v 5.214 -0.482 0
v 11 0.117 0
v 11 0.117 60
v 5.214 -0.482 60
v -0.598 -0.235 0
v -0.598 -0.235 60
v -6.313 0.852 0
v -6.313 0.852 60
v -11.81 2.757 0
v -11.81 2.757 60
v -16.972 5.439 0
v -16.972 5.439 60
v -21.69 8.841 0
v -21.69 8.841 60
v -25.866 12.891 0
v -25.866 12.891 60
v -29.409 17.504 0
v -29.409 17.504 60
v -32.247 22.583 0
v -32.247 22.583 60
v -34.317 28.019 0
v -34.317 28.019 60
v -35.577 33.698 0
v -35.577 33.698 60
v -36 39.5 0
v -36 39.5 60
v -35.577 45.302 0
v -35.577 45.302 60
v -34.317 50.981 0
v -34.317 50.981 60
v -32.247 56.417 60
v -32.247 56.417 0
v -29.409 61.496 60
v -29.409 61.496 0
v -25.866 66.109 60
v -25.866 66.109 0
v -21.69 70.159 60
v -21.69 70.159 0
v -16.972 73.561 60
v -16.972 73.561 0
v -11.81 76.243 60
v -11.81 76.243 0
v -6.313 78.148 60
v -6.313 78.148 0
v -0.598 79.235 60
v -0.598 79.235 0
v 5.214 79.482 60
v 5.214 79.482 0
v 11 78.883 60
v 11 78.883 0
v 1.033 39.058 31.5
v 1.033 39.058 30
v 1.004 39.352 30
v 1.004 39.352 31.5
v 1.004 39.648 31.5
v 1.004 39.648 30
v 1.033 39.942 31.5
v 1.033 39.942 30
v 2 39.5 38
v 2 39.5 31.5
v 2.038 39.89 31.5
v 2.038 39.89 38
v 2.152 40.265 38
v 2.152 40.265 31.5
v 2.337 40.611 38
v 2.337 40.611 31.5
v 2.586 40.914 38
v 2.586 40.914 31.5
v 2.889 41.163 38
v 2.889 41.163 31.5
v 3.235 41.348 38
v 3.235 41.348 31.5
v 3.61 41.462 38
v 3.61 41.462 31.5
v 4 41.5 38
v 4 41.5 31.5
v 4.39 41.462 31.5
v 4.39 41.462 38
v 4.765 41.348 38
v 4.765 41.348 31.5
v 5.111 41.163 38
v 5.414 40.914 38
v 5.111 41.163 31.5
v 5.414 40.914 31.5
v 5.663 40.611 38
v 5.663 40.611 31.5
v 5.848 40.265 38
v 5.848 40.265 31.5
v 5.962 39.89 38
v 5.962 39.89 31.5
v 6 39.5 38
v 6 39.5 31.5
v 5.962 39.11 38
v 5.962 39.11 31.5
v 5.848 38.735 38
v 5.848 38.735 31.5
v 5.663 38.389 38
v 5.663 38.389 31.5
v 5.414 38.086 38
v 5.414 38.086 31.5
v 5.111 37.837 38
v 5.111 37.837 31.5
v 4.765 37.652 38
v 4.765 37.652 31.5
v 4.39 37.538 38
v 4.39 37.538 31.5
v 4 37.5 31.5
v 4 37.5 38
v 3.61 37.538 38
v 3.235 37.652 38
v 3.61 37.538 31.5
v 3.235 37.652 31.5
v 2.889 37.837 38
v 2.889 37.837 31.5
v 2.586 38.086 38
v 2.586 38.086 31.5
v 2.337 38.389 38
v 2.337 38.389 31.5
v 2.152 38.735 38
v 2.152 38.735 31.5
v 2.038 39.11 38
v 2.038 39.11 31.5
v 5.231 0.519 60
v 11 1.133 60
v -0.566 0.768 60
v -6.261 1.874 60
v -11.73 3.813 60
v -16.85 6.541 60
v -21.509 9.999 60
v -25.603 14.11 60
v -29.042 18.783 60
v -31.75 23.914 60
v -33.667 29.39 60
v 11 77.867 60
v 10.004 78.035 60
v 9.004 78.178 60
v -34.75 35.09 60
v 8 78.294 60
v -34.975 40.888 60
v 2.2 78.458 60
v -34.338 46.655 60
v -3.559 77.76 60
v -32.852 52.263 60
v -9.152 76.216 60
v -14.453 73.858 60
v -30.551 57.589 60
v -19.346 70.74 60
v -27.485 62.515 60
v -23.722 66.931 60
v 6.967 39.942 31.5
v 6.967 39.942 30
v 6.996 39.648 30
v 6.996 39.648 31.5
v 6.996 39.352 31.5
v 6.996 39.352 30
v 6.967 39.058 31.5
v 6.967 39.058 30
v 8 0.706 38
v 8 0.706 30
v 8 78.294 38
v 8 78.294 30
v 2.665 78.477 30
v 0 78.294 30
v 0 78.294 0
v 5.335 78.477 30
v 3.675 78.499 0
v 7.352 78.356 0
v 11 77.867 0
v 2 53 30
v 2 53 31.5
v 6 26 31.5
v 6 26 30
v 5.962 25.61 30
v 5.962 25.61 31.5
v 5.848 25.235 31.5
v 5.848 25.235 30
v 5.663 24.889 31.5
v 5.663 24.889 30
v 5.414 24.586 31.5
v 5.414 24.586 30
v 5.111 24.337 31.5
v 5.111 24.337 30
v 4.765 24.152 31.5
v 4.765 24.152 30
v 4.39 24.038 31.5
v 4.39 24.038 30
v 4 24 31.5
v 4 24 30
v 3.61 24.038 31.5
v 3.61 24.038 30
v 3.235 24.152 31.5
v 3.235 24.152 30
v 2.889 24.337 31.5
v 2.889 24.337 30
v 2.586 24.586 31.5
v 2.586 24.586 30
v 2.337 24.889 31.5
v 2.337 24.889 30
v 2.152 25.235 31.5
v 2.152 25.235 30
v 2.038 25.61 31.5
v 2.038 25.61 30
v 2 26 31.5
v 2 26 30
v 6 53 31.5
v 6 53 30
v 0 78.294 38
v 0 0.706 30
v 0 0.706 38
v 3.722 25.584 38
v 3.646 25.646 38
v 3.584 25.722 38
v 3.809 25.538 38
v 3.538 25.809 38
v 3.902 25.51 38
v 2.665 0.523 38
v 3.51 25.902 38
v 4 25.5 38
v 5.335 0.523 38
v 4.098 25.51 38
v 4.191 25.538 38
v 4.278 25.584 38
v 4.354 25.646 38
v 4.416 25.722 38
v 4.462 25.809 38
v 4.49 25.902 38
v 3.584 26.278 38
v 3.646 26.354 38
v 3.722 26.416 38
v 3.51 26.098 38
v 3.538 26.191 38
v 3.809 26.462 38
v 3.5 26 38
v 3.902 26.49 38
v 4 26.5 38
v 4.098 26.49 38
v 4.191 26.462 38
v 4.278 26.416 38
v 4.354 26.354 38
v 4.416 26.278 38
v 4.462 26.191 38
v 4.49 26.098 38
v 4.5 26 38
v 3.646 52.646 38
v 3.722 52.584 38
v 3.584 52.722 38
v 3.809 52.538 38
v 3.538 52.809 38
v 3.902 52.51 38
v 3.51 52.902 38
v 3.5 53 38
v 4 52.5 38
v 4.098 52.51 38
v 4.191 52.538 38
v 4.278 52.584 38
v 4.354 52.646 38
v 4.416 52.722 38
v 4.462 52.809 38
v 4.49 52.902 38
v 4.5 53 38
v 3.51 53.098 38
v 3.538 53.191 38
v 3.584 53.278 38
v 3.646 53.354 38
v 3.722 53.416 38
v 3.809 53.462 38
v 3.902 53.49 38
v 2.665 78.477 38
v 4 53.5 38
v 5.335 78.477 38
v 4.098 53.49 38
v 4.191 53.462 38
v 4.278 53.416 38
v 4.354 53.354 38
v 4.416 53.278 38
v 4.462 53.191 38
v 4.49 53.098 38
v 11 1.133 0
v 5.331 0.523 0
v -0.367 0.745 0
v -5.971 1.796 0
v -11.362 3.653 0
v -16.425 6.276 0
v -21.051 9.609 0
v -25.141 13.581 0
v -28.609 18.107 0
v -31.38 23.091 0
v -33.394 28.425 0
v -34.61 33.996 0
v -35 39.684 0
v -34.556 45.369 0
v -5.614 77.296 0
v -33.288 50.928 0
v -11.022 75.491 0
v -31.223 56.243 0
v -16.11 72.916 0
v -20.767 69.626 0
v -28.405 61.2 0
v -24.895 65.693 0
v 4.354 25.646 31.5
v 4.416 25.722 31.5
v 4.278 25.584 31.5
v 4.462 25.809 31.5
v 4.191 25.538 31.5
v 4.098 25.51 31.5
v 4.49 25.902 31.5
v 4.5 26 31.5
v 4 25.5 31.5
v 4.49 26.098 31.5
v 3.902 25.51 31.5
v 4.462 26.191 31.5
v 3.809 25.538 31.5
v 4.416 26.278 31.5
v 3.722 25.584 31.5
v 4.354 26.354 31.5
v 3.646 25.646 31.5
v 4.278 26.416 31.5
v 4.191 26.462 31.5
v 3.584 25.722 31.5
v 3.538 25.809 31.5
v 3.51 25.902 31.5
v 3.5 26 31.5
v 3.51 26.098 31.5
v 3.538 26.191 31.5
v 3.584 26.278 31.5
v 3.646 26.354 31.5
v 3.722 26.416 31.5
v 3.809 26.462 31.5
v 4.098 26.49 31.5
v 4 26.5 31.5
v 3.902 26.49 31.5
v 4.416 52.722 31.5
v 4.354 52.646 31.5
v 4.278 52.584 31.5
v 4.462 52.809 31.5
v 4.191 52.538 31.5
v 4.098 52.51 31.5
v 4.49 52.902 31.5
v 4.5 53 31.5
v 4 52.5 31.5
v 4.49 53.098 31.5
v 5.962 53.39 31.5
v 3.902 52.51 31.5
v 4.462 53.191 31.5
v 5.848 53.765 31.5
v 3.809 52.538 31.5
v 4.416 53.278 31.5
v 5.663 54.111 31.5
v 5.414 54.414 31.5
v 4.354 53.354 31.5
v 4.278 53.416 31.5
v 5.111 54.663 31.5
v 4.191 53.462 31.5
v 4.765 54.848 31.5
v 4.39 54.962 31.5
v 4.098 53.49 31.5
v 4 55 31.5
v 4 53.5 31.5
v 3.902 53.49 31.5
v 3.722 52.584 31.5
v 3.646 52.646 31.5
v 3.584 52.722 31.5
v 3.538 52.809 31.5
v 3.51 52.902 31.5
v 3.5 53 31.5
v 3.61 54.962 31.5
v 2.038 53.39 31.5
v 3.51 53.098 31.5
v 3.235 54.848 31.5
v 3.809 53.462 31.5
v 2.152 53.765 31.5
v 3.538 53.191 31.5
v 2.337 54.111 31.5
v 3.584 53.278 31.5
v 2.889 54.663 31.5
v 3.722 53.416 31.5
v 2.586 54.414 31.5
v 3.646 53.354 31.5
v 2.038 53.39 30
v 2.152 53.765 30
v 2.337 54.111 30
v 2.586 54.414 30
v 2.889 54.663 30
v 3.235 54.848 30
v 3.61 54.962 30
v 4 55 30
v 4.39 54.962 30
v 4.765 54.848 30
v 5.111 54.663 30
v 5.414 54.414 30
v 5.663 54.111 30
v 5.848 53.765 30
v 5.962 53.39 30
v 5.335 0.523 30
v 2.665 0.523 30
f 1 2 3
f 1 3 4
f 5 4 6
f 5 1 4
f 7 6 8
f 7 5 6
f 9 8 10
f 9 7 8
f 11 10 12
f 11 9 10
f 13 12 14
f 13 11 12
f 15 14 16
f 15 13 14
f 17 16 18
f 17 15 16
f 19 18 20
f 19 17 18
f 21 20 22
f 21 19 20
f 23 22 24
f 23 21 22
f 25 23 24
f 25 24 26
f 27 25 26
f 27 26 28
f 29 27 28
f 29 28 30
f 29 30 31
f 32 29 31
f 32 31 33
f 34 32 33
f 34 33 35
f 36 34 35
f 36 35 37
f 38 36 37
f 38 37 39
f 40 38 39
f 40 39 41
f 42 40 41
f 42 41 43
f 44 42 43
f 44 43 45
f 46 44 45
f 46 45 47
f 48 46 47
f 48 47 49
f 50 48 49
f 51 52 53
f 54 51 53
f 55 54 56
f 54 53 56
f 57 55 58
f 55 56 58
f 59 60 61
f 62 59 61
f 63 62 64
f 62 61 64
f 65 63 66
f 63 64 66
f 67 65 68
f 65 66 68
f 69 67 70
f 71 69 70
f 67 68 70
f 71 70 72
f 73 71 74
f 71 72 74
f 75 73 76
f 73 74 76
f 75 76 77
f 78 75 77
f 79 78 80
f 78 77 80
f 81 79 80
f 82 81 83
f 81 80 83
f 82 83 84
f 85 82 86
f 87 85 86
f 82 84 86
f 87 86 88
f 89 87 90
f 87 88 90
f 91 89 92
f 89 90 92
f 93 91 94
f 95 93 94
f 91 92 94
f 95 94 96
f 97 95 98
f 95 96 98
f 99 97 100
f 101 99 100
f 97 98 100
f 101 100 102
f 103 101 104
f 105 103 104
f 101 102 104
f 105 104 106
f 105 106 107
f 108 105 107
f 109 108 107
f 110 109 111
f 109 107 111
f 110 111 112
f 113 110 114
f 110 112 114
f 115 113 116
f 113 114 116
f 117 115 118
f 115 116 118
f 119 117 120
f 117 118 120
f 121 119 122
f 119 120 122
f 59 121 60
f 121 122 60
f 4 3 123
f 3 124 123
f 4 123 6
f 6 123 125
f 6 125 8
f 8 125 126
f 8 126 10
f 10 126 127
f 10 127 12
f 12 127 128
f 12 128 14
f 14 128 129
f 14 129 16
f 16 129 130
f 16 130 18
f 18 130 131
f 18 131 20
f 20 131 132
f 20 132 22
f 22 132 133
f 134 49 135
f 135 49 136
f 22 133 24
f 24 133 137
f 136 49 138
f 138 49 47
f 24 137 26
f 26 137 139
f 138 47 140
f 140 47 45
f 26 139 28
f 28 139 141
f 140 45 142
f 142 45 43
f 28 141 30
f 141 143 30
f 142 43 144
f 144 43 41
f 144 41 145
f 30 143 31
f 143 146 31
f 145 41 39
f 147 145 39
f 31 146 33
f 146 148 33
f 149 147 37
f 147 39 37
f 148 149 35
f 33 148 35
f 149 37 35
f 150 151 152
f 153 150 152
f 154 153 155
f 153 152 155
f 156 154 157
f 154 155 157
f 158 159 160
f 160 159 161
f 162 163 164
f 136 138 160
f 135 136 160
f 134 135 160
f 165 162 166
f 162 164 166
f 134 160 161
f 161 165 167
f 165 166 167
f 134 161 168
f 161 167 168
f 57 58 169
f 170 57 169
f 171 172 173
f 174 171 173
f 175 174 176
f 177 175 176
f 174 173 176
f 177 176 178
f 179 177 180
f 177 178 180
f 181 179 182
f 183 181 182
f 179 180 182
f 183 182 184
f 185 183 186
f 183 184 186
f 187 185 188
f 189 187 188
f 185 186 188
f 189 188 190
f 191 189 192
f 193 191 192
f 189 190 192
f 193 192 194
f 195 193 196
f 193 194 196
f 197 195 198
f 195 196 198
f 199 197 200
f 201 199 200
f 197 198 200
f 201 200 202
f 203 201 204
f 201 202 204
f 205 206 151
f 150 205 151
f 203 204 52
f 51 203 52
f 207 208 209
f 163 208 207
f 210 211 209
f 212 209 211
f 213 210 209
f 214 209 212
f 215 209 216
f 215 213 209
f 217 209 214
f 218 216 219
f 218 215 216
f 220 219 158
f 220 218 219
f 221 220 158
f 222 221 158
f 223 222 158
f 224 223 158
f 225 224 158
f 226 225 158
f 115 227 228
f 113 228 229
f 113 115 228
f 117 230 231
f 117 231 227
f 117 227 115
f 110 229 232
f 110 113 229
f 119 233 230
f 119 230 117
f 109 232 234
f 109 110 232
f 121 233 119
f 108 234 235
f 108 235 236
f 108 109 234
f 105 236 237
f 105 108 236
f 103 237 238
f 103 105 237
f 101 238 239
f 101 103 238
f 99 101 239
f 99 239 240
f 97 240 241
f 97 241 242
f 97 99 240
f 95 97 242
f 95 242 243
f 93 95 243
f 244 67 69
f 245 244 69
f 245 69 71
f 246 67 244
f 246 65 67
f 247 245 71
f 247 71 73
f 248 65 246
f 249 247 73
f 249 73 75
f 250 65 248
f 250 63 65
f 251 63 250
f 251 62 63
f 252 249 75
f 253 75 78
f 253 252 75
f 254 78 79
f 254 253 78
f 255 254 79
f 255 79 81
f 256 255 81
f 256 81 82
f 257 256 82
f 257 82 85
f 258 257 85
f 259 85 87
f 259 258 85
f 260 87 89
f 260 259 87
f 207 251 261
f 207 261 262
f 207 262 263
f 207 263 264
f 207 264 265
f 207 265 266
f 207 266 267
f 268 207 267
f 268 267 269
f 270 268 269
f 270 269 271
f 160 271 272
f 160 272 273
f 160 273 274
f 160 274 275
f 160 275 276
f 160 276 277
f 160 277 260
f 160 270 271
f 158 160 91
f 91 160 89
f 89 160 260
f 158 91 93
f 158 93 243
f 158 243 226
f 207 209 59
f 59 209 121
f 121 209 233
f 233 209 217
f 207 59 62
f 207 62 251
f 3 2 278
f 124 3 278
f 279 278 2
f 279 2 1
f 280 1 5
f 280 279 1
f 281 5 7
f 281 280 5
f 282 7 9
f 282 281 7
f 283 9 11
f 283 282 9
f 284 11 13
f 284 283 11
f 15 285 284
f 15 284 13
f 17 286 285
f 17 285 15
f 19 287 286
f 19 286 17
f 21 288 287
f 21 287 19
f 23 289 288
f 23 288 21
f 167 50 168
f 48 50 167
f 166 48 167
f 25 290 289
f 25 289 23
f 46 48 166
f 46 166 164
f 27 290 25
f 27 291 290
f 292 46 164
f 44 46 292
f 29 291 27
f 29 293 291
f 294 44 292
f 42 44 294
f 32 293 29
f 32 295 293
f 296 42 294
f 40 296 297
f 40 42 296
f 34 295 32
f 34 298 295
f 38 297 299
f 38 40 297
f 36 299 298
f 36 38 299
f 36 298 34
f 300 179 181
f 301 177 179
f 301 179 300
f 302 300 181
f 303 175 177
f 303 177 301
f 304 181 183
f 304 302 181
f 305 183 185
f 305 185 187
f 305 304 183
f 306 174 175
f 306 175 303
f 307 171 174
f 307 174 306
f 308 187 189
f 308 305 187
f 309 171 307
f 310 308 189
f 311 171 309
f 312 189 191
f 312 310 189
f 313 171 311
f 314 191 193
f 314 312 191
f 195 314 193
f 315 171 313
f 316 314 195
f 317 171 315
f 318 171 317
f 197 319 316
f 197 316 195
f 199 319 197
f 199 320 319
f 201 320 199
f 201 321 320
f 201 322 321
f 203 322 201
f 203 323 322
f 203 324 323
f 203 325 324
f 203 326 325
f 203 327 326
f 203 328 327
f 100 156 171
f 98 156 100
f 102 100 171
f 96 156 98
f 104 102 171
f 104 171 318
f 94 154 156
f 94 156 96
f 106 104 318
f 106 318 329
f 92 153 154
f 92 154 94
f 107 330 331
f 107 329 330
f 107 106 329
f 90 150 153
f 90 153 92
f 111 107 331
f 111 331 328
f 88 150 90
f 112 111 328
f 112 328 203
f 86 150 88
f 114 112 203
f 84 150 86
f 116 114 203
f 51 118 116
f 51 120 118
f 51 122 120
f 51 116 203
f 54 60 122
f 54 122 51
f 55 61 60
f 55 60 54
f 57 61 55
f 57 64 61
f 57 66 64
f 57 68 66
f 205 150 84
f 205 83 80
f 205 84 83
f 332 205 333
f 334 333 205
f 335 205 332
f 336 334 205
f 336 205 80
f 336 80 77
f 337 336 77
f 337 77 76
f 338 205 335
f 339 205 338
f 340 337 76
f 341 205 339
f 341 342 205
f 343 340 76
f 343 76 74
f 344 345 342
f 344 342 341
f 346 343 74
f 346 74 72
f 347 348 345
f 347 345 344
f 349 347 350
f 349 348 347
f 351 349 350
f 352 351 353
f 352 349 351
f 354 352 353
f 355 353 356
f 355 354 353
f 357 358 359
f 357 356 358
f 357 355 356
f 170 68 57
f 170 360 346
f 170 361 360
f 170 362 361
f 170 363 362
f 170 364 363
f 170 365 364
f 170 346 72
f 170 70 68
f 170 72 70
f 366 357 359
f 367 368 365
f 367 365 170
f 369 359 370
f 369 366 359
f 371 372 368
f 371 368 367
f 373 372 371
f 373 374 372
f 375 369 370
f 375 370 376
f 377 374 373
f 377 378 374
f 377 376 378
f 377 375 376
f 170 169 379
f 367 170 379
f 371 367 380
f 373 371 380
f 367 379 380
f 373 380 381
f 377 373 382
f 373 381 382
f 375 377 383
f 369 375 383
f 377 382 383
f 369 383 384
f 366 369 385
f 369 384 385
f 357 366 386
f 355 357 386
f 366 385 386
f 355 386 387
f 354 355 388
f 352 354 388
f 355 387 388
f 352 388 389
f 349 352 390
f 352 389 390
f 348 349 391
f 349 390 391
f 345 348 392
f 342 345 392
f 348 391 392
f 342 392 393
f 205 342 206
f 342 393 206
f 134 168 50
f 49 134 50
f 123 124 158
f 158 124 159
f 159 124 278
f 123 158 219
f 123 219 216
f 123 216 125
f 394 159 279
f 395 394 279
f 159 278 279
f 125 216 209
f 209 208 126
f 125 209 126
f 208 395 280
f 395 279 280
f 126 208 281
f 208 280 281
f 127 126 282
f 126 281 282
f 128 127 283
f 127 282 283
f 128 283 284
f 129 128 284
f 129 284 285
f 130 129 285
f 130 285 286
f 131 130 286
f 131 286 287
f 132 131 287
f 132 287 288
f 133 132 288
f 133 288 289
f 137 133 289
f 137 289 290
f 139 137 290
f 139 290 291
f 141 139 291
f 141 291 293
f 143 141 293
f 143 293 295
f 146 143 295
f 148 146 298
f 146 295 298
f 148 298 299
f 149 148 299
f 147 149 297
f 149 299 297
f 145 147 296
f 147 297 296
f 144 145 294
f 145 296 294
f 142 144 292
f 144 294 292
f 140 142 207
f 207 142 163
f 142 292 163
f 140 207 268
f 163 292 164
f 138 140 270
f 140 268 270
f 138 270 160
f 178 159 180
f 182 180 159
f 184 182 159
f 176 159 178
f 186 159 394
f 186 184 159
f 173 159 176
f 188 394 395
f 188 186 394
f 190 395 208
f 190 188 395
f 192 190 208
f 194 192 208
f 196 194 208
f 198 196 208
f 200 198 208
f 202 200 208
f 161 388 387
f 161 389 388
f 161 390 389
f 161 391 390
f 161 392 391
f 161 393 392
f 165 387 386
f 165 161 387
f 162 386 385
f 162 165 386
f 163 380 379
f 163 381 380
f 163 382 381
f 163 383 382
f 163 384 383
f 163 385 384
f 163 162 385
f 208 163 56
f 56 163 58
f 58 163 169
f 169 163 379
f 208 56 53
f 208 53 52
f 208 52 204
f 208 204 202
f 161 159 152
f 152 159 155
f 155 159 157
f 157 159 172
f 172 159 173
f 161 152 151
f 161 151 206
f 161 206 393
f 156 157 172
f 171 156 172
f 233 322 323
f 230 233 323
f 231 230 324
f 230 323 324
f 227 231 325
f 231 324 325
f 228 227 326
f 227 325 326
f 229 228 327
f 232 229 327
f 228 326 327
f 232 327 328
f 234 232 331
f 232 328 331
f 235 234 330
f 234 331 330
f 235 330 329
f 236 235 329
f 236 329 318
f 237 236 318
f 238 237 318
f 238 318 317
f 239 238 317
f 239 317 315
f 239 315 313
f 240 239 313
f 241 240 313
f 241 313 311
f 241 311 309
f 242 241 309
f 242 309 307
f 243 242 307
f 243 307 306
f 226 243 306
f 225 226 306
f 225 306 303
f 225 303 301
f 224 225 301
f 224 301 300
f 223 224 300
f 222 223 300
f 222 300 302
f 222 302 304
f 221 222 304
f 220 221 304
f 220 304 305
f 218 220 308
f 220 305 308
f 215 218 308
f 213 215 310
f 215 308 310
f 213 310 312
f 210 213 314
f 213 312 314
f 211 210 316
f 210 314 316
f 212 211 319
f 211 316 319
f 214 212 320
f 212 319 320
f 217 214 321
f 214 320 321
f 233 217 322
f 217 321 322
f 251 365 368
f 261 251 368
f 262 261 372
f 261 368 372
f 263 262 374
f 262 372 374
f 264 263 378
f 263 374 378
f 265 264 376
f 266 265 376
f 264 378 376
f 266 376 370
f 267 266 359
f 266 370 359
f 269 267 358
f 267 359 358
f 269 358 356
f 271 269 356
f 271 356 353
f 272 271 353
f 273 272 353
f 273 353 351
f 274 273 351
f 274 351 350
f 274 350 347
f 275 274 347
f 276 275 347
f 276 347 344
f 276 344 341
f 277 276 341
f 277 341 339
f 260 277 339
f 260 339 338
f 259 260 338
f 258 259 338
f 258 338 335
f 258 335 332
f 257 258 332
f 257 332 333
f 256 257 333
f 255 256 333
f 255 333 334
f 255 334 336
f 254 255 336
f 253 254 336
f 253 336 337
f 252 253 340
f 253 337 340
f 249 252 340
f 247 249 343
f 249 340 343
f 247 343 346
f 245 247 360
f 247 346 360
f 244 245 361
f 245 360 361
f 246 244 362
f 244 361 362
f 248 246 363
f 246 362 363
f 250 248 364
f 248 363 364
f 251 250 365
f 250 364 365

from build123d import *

# Parameters (mm, degrees)
ESQUISSE1_W              = 8
ESQUISSE1_H              = 79
BOSS_EXTRU_1_DEPTH       = 60
ESQUISSE3_R              = 40
ESQUISSE3_R_2            = 39
BOSS_EXTRU_2_DEPTH       = 60
ESQUISSE4_R              = 39
ENL_V_MAT_EXTRU_3_DEPTH  = 30
ENL_V_MAT_EXTRU_5_DEPTH  = 1.5
ESQUISSE6_R              = 39
ENL_V_MAT_EXTRU_6_DEPTH  = 22
ESQUISSE7_R              = 2
ENL_V_MAT_EXTRU_7_DEPTH  = 6.5
ESQUISSE9_R              = 0.5
ENL_V_MAT_EXTRU_8_DEPTH  = 29.5
ENL_V_MAT_EXTRU_10_REACH = 62
ESQUISSE11_W             = 40
ESQUISSE11_H             = 82


with BuildPart() as part:
    # Esquisse1 → Boss.-Extru.1 (new body)
    with BuildSketch(Plane.XY):
        with Locations((4, 39.5)):
            Rectangle(ESQUISSE1_W, ESQUISSE1_H)
    extrude(amount=BOSS_EXTRU_1_DEPTH)

    # Esquisse3 → Boss.-Extru.2 (add)
    with BuildSketch(Plane(origin=(0, 0, 0), x_dir=(-1, 0, 0), z_dir=(0, 0, -1))):
        with Locations((-4, 39.5)):
            Circle(ESQUISSE3_R)
        with Locations((-4, 39.5)):
            Circle(ESQUISSE3_R_2, mode=Mode.SUBTRACT)
    extrude(amount=-BOSS_EXTRU_2_DEPTH)

    # Esquisse4 → Enlèv. mat.-Extru.3 (cut)
    with BuildSketch(Plane(origin=(0, 0, 0), x_dir=(-1, 0, 0), z_dir=(0, 0, -1))):
        with Locations((-4, 39.5)):
            Circle(ESQUISSE4_R)
    extrude(amount=-ENL_V_MAT_EXTRU_3_DEPTH, mode=Mode.SUBTRACT)

    # Esquisse5 → Enlèv. mat.-Extru.5 (cut)
    with BuildSketch(Plane(origin=(0, 0, 30), x_dir=(-1, 0, 0), z_dir=(0, 0, -1))):
        with BuildLine():
            Line((-6, 53), (-6.967257844, 39.9420191))
            ThreePointArc((-6.967257844, 39.9420191), (-7, 39.5), (-6.967257844, 39.0579809))
            Line((-6.967257844, 39.0579809), (-6, 26))
            ThreePointArc((-6, 26), (-4, 24), (-2, 26))
            Line((-2, 26), (-1.032742156, 39.0579809))
            ThreePointArc((-1.032742156, 39.0579809), (-1, 39.5), (-1.032742156, 39.9420191))
            Line((-1.032742156, 39.9420191), (-2, 53))
            ThreePointArc((-2, 53), (-4, 55), (-6, 53))
        make_face()
    extrude(amount=-ENL_V_MAT_EXTRU_5_DEPTH, mode=Mode.SUBTRACT)

    # Esquisse6 → Enlèv. mat.-Extru.6 (cut)
    with BuildSketch(Plane.XY.offset(60)):
        with Locations((4, 39.5)):
            Circle(ESQUISSE6_R)
    extrude(amount=-ENL_V_MAT_EXTRU_6_DEPTH, mode=Mode.SUBTRACT)

    # Esquisse7 → Enlèv. mat.-Extru.7 (cut)
    with BuildSketch(Plane(origin=(0, 0, 31.5), x_dir=(-1, 0, 0), z_dir=(0, 0, -1))):
        with Locations((-4, 39.5)):
            Circle(ESQUISSE7_R)
    extrude(amount=-ENL_V_MAT_EXTRU_7_DEPTH, mode=Mode.SUBTRACT)

    # Esquisse9 → Enlèv. mat.-Extru.8 (cut, through all)
    with BuildSketch(Plane(origin=(0, 0, 31.5), x_dir=(-1, 0, 0), z_dir=(0, 0, -1))):
        with Locations((-4, 53)):
            Circle(ESQUISSE9_R)
        with Locations((-4, 26)):
            Circle(ESQUISSE9_R)
    extrude(amount=-ENL_V_MAT_EXTRU_8_DEPTH, mode=Mode.SUBTRACT)

    # Esquisse11 → Enlèv. mat.-Extru.10 (cut, up to next)
    with BuildSketch(Plane.XY, mode=Mode.PRIVATE) as enl_v_mat_extru_10_sk1:
        with Locations((31, 39.5)):
            Rectangle(ESQUISSE11_W, ESQUISSE11_H)
    enl_v_mat_extru_10_tool1 = extrude(enl_v_mat_extru_10_sk1.sketch, amount=ENL_V_MAT_EXTRU_10_REACH, mode=Mode.PRIVATE) & part.part
    add(enl_v_mat_extru_10_tool1.solids().sort_by_distance((31, 39.5, 0))[0], mode=Mode.SUBTRACT)


solid = part.part
